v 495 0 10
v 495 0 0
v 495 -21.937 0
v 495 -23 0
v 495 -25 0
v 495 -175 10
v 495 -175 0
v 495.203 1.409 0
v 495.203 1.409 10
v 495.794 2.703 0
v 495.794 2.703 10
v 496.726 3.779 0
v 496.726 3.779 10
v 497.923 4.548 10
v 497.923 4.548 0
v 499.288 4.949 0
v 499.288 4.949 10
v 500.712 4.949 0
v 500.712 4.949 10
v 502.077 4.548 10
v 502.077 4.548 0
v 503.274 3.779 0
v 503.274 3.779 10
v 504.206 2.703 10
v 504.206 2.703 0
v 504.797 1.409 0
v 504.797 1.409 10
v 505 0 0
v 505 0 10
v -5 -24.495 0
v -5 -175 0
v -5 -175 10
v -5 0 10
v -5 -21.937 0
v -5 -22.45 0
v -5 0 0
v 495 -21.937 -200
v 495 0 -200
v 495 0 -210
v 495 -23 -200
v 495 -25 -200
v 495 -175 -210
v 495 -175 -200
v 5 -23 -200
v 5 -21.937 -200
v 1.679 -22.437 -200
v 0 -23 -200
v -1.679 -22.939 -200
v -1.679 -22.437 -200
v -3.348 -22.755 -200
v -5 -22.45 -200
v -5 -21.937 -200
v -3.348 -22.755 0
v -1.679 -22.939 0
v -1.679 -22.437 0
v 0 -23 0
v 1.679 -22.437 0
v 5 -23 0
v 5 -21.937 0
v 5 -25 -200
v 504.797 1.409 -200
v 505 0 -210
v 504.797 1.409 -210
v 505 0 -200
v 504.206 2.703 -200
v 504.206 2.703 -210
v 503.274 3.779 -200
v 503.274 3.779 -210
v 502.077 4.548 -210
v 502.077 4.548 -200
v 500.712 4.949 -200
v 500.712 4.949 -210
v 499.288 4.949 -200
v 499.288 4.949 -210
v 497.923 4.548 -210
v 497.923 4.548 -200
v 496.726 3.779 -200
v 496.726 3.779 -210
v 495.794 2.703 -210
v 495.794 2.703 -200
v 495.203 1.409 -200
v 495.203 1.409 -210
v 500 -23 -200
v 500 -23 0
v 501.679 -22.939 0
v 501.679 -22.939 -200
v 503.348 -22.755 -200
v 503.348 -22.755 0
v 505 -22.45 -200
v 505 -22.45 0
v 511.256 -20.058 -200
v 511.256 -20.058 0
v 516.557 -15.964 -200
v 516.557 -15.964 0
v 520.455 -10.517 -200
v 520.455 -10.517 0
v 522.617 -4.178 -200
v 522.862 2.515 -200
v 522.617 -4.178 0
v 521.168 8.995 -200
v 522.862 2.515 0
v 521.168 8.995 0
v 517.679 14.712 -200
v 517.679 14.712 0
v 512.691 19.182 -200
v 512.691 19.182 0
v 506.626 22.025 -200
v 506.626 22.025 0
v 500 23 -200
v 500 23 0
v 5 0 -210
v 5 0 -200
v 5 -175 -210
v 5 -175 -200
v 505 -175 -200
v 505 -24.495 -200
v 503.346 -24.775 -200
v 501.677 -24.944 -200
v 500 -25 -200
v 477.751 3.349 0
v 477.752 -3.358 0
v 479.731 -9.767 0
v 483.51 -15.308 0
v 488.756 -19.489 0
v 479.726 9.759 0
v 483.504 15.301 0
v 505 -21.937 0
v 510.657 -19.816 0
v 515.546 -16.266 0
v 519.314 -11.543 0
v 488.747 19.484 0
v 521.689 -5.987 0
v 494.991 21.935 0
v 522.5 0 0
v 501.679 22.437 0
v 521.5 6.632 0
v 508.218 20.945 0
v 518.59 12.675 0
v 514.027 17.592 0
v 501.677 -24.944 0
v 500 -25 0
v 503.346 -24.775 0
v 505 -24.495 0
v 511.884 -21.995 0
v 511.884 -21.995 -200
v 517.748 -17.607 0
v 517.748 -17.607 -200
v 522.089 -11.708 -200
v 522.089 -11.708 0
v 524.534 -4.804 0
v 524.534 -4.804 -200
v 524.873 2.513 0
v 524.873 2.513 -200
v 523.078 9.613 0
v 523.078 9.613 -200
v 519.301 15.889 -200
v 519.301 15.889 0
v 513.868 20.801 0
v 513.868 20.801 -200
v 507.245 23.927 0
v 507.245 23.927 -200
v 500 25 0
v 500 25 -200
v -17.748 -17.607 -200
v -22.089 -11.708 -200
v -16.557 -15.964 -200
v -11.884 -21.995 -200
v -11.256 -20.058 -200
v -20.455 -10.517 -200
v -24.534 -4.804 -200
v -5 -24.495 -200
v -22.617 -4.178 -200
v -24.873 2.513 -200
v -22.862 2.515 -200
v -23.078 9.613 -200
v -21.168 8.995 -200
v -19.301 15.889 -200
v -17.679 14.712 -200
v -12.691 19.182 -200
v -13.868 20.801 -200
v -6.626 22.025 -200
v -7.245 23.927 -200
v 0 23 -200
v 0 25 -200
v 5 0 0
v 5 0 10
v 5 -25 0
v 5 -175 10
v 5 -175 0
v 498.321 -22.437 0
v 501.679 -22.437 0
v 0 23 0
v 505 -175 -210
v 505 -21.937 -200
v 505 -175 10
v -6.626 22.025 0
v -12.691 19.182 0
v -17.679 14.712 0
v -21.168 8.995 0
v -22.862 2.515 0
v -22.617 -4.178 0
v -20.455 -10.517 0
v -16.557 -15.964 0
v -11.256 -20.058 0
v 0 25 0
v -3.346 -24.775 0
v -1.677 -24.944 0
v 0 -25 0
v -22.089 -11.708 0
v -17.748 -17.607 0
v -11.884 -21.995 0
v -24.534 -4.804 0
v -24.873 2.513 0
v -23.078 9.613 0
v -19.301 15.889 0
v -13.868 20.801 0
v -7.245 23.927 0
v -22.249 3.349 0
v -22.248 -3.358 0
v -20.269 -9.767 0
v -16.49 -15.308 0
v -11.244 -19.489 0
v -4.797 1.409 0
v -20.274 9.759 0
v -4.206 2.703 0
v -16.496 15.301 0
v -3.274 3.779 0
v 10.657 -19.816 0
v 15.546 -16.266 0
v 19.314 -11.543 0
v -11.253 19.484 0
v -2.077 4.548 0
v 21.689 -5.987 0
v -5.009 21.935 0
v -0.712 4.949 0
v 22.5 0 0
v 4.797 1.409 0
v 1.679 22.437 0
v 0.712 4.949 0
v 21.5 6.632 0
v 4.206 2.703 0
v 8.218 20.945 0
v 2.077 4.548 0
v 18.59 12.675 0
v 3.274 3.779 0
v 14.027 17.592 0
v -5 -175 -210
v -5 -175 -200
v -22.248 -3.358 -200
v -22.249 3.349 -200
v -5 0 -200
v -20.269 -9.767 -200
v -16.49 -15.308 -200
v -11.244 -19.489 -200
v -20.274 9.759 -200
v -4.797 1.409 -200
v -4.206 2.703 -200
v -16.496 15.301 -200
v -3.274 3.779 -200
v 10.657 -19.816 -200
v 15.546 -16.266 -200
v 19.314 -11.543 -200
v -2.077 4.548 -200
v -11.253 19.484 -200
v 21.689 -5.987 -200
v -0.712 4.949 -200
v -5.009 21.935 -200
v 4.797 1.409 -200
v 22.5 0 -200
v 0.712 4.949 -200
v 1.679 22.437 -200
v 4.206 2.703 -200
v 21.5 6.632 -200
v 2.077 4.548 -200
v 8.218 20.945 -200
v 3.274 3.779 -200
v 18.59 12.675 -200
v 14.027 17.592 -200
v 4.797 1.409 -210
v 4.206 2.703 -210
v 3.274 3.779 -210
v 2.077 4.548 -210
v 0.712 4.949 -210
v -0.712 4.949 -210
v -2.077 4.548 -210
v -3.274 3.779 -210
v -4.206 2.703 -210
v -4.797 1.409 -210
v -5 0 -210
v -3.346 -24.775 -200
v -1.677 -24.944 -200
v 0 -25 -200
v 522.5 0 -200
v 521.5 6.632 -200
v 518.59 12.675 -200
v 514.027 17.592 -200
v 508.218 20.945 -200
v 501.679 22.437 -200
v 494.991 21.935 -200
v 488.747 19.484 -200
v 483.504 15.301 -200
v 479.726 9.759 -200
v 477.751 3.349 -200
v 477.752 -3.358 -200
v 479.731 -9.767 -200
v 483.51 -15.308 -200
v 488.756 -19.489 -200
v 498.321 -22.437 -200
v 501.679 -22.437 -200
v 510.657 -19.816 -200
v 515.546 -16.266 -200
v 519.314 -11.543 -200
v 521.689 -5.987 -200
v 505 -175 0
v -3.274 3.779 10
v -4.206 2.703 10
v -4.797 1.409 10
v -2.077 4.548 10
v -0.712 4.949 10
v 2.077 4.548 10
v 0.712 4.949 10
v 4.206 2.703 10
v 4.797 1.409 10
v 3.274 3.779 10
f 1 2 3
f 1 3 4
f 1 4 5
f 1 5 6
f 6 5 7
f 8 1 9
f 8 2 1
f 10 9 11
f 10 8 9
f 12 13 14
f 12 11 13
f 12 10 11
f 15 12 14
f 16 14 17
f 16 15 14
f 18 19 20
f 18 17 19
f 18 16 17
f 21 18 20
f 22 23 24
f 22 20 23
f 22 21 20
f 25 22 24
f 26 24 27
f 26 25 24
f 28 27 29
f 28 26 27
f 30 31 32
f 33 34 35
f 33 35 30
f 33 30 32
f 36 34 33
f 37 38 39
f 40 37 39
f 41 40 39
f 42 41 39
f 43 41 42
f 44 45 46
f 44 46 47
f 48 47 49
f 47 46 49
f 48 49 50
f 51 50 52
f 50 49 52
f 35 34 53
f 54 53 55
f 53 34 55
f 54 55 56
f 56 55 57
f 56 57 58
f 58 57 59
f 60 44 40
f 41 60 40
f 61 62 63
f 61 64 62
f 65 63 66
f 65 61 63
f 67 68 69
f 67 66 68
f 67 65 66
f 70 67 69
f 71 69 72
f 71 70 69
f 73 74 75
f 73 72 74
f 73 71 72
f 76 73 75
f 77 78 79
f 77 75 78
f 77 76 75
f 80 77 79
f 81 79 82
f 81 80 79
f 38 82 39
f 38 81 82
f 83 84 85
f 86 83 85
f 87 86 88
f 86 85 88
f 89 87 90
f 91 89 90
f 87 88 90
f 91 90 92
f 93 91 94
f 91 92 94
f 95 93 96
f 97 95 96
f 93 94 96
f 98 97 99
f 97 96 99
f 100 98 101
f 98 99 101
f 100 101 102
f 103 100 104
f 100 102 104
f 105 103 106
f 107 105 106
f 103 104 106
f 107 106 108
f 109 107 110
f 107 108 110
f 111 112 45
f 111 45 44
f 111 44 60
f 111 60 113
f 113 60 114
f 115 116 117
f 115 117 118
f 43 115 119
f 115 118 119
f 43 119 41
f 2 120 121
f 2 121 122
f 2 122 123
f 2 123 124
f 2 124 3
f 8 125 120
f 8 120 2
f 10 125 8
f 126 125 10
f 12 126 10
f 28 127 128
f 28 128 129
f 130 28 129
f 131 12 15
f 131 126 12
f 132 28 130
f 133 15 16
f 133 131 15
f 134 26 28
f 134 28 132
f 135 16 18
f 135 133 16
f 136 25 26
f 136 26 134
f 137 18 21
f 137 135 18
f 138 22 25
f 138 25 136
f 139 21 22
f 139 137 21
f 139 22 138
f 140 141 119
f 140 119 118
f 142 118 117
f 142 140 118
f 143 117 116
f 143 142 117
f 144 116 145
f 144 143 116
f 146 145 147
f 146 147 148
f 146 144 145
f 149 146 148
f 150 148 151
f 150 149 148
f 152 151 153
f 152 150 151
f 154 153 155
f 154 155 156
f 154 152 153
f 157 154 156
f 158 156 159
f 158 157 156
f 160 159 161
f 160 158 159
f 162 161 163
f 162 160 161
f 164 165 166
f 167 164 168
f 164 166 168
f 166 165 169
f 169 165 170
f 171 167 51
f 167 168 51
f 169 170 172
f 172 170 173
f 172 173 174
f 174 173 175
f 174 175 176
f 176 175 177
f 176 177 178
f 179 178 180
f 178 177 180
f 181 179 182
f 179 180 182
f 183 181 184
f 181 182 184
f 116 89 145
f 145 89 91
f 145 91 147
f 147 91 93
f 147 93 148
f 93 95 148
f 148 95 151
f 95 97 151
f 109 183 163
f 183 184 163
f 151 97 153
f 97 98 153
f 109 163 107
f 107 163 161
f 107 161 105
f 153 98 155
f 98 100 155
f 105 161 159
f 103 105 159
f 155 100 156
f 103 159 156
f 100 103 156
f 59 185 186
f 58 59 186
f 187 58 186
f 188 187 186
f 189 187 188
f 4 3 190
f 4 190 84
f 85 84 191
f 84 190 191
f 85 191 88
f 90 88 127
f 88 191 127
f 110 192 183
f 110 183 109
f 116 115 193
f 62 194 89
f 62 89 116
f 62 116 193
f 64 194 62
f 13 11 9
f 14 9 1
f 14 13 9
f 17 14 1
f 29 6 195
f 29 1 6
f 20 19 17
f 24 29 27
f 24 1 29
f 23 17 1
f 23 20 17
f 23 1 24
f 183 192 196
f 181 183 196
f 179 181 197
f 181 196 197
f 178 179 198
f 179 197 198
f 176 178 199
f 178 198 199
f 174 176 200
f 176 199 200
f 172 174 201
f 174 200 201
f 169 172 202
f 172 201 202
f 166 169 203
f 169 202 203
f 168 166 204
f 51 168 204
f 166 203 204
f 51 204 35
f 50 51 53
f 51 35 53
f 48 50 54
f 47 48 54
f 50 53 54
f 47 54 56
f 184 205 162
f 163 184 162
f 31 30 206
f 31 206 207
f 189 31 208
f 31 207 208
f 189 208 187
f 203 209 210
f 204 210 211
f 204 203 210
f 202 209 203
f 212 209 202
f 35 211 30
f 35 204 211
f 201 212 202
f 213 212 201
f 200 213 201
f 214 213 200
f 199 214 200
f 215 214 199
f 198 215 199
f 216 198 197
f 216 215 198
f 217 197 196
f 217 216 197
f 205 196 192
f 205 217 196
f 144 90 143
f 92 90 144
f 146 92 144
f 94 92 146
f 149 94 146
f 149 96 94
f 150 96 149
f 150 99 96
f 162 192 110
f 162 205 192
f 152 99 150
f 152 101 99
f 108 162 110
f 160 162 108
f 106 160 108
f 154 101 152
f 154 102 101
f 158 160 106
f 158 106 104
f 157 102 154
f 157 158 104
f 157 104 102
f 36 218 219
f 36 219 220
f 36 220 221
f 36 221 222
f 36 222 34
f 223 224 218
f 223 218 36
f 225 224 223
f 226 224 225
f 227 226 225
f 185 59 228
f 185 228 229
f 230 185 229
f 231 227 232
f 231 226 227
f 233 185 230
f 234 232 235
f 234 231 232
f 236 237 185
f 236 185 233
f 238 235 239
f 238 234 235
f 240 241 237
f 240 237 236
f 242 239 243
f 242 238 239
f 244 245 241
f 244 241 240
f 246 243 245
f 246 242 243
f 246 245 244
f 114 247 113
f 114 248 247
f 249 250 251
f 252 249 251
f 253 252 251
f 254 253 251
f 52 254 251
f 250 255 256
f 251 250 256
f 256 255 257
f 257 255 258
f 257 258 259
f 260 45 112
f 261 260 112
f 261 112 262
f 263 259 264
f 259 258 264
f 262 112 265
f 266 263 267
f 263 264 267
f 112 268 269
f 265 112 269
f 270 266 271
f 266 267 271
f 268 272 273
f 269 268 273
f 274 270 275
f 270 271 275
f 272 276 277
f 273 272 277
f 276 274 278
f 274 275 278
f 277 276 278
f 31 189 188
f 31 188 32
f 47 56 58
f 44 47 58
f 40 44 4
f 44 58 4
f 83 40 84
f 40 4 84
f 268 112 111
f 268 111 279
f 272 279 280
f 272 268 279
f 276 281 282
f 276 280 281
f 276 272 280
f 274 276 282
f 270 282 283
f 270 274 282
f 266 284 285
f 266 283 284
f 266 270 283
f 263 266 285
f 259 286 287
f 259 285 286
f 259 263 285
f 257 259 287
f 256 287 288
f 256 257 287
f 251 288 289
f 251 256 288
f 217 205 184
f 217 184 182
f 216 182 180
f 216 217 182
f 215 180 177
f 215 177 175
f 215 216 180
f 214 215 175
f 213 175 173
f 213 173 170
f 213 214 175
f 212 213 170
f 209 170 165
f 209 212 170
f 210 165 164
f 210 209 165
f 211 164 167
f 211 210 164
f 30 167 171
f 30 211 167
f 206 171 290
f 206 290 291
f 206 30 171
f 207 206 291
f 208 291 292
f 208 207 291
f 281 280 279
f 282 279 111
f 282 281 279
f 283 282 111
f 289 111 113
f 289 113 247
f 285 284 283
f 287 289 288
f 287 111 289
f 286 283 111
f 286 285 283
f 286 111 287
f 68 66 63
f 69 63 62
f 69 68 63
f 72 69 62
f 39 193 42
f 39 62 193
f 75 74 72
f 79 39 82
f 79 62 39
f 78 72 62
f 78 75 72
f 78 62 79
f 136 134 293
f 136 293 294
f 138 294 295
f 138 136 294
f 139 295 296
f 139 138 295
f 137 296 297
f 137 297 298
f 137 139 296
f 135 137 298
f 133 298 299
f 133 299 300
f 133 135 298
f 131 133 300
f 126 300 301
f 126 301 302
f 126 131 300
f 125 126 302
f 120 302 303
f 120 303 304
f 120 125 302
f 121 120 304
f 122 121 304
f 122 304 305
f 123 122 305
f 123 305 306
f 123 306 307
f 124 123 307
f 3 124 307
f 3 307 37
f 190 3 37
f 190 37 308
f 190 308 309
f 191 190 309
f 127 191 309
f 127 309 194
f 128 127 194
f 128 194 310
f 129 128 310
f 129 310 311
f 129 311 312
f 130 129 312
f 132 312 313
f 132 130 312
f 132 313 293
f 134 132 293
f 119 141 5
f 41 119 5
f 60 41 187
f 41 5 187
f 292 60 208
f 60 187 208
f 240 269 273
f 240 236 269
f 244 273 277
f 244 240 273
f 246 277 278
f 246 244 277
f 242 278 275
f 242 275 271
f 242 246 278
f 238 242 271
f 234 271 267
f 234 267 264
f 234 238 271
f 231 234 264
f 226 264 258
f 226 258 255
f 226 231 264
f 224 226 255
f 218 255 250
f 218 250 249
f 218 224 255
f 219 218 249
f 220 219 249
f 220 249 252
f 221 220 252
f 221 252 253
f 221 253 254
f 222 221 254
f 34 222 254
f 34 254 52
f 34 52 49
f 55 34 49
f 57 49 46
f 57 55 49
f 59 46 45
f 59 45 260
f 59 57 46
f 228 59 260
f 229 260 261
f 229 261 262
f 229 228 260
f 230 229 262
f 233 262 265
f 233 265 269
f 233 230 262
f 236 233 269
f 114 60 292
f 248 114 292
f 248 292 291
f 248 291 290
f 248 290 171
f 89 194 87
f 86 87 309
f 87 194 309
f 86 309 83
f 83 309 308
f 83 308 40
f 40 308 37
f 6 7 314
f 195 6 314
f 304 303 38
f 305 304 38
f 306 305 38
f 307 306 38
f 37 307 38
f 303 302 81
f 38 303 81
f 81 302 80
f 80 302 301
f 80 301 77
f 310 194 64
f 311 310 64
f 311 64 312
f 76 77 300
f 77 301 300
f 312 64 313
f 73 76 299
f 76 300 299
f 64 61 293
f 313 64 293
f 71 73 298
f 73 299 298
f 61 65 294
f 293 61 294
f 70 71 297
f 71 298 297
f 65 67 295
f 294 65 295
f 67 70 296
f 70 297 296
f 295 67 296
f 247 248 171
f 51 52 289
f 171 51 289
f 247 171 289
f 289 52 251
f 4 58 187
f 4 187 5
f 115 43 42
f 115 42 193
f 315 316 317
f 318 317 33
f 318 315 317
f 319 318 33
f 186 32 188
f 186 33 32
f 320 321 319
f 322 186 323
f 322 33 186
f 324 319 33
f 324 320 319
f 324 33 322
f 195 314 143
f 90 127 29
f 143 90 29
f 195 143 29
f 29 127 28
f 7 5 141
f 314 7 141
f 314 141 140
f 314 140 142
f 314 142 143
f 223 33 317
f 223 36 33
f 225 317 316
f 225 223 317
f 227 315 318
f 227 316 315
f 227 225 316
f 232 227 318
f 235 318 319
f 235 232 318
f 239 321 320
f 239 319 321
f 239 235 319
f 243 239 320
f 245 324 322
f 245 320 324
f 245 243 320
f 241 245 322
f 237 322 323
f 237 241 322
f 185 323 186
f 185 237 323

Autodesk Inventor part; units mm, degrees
ref_plane "YZ Plane" through (0, 0, 0) normal (1, 0, 0) x (0, 1, 0)
ref_plane "XZ Plane" through (0, 0, 0) normal (0, 1, 0) x (-1, 0, 0)
ref_plane "XY Plane" through (0, 0, 0) normal (0, 0, 1) x (1, 0, 0)
sketch "Sketch1" plane through (0, 0, 0) normal (0, 0, 1) x (1, 0, 0)
  arc A0 (0, 25) -> (0, -25) centre (0, 0) ccw
  arc A1 (500, -25) -> (500, 25) centre (500, 0) ccw
  line L0 (0, 25) -> (500, 25)
  line L1 (500, -25) -> (0, -25)
  arc A2 (0, 23) -> (0, -23) centre (0, 0) ccw
  arc A3 (500, -23) -> (500, 23) centre (500, 0) ccw
  line L2 (500, 0) -> (500, 23) construction
  line L3 (500, 0) -> (523, 0) construction
  line L4 (0, 23) -> (500, 23)
  line L5 (0, -23) -> (500, -23)
  dimension "D" = 50
  dimension "d2" = 50
  dimension "r" = 23
  dimension "d6" = 23
  dimension "d7" = 90
  dimension "L" = 500
extrude "Extrusion1" add sketch "Sketch1" against normal blind 200
sketch "Sketch2" plane through (0, 0, 0) normal (0, 0, 1) x (1, 0, 0)
  circle A0 centre (0, 0) radius 22.5
  arc A1 (500, -23) -> (500, 23) centre (500, 0) ccw construction
  circle A2 centre (500, 0) radius 22.5
  point P0 (300, -23)
  dimension "d" = 45
  dimension "d12" = 45
extrude "Extrusion2" add sketch "Sketch2" against normal blind 200
sketch "Sketch3" plane through (0, 0, 0) normal (0, 0, 1) x (1, 0, 0)
  arc A0 (5, 0) -> (-5, 0) centre (0, 0) ccw
  circle A1 centre (500, 0) radius 22.5 construction
  arc A2 (505, 0) -> (495, 0) centre (500, 0) ccw
  line L0 (5, 0) -> (5, -175)
  line L1 (5, -175) -> (-5, -175)
  line L2 (-5, -175) -> (-5, 0)
  line L3 (495, 0) -> (495, -175)
  line L4 (495, -175) -> (505, -175)
  line L5 (505, -175) -> (505, 0)
  dimension "altura" = 175
  dimension "d19" = 175
  dimension "d20" = 5
  dimension "d21" = 5
extrude "Extrusion3" add sketch "Sketch3" along normal blind 10
sketch "Sketch4" plane through (0, 0, -200) normal (0, 0, -1) x (-1, 0, 0)
  arc A0 (5, 0) -> (-5, 0) centre (0, 0) ccw projected
  arc A1 (5, 0) -> (-5, 0) centre (0, 0) ccw
  arc A2 (-495, 0) -> (-505, 0) centre (-500, 0) ccw projected
  arc A3 (-495, 0) -> (-505, 0) centre (-500, 0) ccw
  line L0 (-505, -175) -> (-505, 0) projected
  line L1 (-495, 0) -> (-495, -175) projected
  line L2 (-495, 0) -> (-495, -175)
  line L3 (-495, -175) -> (-505, -175)
  line L4 (-505, -175) -> (-505, 0)
  line L5 (5, -175) -> (-5, -175) projected
  line L6 (-5, 0) -> (-5, -175)
  line L7 (-5, -175) -> (5, -175)
  line L8 (5, -175) -> (5, 0)
  point P0 (-5, 0)
extrude "Extrusion4" add sketch "Sketch4" along normal blind 10
equation "\"d2\" = D"
equation "\"d6\" = r"
equation "\"d12\" = d"
equation "\"d19\" = altura"
properties part number "Banda"
